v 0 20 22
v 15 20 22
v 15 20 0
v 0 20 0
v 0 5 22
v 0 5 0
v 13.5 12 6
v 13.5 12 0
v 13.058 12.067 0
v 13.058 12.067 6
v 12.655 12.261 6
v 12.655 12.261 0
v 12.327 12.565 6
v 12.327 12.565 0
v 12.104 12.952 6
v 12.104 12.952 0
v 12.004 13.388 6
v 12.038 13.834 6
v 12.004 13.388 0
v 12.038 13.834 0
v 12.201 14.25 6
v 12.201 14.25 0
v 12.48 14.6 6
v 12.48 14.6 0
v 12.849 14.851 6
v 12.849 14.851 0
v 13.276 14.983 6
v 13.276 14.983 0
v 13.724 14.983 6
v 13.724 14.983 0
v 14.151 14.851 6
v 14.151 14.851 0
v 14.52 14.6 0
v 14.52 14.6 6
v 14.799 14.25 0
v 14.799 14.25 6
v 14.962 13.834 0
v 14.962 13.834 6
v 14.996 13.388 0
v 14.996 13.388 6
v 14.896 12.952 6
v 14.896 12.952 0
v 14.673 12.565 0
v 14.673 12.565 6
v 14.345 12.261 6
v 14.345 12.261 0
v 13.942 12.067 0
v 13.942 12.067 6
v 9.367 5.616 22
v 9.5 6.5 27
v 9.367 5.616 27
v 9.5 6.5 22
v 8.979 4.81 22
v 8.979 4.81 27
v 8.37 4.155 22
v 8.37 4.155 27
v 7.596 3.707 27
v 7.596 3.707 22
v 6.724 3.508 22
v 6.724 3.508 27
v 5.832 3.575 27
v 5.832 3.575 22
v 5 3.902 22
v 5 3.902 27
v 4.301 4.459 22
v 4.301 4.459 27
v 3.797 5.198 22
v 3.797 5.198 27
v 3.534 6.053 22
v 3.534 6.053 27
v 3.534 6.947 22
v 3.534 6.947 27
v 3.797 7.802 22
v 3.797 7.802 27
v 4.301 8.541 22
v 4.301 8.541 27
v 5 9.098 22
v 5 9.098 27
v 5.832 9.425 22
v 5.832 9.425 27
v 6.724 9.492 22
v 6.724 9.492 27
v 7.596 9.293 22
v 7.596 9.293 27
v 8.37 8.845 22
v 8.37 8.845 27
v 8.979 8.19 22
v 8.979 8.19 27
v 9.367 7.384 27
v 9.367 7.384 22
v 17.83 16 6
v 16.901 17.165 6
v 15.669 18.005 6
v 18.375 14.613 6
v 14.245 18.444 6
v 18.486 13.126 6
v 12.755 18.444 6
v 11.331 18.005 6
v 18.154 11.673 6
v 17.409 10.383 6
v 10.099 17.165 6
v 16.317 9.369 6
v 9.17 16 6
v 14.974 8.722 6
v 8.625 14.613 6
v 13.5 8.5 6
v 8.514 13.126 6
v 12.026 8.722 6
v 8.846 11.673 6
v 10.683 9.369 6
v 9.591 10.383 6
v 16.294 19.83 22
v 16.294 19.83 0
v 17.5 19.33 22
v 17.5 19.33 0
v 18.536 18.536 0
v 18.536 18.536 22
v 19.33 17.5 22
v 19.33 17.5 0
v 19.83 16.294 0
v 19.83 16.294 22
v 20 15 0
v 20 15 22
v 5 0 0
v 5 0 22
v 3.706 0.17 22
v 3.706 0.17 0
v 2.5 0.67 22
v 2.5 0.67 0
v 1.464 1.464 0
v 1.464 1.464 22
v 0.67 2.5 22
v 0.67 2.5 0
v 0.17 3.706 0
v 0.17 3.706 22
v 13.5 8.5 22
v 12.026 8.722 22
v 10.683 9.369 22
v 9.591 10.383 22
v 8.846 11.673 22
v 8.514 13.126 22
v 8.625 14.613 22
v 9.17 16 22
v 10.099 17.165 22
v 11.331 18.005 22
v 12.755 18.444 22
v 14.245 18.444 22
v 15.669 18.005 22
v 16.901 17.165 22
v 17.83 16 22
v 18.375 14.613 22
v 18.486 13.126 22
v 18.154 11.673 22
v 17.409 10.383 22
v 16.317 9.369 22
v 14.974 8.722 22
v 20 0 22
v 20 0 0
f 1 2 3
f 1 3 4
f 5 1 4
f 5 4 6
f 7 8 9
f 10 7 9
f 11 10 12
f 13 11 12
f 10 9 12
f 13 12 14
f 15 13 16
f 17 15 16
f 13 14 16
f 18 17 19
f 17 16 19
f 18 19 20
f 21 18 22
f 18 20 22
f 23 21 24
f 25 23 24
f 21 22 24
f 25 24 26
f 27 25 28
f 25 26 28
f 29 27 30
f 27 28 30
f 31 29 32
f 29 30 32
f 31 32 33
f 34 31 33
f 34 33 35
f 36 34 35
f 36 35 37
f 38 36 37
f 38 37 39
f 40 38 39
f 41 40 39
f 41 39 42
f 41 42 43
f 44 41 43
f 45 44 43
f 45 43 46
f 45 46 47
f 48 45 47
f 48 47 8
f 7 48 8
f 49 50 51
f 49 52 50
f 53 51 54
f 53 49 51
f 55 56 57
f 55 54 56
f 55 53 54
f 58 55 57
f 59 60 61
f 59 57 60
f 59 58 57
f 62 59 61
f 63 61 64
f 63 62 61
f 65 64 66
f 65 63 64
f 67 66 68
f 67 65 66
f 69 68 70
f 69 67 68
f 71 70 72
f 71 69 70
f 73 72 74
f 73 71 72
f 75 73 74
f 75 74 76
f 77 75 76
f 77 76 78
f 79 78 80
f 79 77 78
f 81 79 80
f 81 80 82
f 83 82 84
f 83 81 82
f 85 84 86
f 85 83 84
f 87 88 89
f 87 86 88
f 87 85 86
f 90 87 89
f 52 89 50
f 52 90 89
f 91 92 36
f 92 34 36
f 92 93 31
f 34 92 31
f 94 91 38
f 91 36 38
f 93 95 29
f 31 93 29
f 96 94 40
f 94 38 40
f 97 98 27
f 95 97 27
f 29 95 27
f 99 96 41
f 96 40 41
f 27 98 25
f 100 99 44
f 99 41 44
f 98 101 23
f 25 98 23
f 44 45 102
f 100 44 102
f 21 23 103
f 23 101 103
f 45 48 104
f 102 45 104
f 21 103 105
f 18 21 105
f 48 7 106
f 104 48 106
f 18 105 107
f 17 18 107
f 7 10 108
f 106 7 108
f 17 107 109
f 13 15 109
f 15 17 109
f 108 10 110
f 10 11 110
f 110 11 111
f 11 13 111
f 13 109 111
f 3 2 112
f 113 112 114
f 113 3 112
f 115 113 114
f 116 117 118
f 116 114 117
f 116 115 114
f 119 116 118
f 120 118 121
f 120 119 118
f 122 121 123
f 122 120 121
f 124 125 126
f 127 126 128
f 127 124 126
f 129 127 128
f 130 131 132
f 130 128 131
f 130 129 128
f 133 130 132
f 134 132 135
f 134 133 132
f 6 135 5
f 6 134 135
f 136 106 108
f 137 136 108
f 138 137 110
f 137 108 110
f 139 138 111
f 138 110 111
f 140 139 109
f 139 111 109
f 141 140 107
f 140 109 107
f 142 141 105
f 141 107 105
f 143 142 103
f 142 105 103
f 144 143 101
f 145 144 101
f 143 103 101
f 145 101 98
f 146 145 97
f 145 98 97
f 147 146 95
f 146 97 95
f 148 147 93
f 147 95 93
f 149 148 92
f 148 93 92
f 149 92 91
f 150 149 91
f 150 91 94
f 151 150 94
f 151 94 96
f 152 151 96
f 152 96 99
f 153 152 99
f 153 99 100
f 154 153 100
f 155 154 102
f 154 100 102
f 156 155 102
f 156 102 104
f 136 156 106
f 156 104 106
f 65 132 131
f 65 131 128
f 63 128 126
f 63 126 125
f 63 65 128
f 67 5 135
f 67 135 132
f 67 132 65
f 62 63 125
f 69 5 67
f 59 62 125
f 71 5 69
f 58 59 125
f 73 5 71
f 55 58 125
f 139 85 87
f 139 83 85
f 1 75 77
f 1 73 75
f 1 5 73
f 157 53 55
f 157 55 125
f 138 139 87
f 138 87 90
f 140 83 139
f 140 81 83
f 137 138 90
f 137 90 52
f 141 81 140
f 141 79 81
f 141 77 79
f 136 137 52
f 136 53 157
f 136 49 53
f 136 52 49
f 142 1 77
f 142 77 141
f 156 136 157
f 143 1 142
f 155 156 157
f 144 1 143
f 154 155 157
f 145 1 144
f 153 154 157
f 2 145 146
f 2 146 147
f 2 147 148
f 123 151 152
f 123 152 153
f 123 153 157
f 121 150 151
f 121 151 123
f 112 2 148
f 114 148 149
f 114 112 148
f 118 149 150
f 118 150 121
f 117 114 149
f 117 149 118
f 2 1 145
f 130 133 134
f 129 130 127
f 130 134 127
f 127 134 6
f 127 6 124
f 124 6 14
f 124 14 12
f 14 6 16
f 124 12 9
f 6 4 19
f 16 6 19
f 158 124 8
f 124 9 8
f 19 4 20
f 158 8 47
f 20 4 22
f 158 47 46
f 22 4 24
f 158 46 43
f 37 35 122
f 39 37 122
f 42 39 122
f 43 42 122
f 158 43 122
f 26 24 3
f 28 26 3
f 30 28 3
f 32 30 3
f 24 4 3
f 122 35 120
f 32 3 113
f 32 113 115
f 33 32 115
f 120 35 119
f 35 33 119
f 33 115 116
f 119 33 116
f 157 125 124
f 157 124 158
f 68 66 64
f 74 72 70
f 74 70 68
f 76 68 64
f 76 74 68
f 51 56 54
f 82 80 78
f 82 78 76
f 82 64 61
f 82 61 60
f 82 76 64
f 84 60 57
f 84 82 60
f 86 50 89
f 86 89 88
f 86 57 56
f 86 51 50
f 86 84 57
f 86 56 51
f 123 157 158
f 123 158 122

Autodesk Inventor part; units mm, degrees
ref_plane "YZ Plane" through (0, 0, 0) normal (1, 0, 0) x (0, 1, 0)
ref_plane "XZ Plane" through (0, 0, 0) normal (0, 1, 0) x (-1, 0, 0)
ref_plane "XY Plane" through (0, 0, 0) normal (0, 0, 1) x (1, 0, 0)
sketch "Sketch1" plane through (0, 0, 0) normal (0, 0, 1) x (1, 0, 0)
  line L0 (5, 0) -> (20, 0)
  line L1 (20, 0) -> (20, 15)
  line L2 (15, 20) -> (0, 20)
  line L3 (0, 20) -> (0, 5)
  arc A0 (20, 15) -> (15, 20) centre (15, 15) ccw
  arc A1 (0, 5) -> (5, 0) centre (5, 5) ccw
  point P0 (0, 0)
  point P1 (20, 20)
  dimension "d0" = 20
  dimension "d1" = 20
  dimension "d4" = 5
  dimension "d5" = 5
extrude "Extrusion1" add sketch "Sketch1" along normal blind 22
sketch "Sketch2" plane through (0, 0, 22) normal (0, 0, 1) x (1, 0, 0)
  line L0 (15, 20) -> (0, 20) projected
  line L1 (20, 0) -> (20, 15) projected
  point P0 (0, 0)
  point P1 (13.5, 13.5)
  dimension "d13" = 6.5
  dimension "d14" = 6.5
hole "Hole1" at (13.5, 13.5, 22) direction (0, 0, -1) diameter 10 depth 16
sketch "Sketch3" plane through (13.5, 13.5, 6) normal (0, 0, 1) x (1, 0, 0)
  line L0 (6.5, -13.5) -> (6.5, 1.5) projected
  line L1 (1.5, 6.5) -> (-13.5, 6.5) projected
  point P0 (-13.5, -13.5)
  point P1 (0, 0)
  dimension "d22" = 6.5
  dimension "d23" = 6.5
hole "Hole2" at (13.5, 13.5, 6) direction (0, 0, -1) diameter 3 depth 16
sketch "Sketch4" plane through (0, 0, 22) normal (0, 0, 1) x (1, 0, 0)
  circle A0 centre (6.5, 6.5) radius 3
  line L0 (5, 0) -> (20, 0) projected
  line L1 (0, 20) -> (0, 5) projected
  point P0 (0, 0)
  dimension "d24" = 6
  dimension "d25" = 6.5
  dimension "d26" = 6.5
extrude "Extrusion2" add sketch "Sketch4" along normal blind 5
properties part number "spacer dubbele hoogte behuizing zonder magneet"
